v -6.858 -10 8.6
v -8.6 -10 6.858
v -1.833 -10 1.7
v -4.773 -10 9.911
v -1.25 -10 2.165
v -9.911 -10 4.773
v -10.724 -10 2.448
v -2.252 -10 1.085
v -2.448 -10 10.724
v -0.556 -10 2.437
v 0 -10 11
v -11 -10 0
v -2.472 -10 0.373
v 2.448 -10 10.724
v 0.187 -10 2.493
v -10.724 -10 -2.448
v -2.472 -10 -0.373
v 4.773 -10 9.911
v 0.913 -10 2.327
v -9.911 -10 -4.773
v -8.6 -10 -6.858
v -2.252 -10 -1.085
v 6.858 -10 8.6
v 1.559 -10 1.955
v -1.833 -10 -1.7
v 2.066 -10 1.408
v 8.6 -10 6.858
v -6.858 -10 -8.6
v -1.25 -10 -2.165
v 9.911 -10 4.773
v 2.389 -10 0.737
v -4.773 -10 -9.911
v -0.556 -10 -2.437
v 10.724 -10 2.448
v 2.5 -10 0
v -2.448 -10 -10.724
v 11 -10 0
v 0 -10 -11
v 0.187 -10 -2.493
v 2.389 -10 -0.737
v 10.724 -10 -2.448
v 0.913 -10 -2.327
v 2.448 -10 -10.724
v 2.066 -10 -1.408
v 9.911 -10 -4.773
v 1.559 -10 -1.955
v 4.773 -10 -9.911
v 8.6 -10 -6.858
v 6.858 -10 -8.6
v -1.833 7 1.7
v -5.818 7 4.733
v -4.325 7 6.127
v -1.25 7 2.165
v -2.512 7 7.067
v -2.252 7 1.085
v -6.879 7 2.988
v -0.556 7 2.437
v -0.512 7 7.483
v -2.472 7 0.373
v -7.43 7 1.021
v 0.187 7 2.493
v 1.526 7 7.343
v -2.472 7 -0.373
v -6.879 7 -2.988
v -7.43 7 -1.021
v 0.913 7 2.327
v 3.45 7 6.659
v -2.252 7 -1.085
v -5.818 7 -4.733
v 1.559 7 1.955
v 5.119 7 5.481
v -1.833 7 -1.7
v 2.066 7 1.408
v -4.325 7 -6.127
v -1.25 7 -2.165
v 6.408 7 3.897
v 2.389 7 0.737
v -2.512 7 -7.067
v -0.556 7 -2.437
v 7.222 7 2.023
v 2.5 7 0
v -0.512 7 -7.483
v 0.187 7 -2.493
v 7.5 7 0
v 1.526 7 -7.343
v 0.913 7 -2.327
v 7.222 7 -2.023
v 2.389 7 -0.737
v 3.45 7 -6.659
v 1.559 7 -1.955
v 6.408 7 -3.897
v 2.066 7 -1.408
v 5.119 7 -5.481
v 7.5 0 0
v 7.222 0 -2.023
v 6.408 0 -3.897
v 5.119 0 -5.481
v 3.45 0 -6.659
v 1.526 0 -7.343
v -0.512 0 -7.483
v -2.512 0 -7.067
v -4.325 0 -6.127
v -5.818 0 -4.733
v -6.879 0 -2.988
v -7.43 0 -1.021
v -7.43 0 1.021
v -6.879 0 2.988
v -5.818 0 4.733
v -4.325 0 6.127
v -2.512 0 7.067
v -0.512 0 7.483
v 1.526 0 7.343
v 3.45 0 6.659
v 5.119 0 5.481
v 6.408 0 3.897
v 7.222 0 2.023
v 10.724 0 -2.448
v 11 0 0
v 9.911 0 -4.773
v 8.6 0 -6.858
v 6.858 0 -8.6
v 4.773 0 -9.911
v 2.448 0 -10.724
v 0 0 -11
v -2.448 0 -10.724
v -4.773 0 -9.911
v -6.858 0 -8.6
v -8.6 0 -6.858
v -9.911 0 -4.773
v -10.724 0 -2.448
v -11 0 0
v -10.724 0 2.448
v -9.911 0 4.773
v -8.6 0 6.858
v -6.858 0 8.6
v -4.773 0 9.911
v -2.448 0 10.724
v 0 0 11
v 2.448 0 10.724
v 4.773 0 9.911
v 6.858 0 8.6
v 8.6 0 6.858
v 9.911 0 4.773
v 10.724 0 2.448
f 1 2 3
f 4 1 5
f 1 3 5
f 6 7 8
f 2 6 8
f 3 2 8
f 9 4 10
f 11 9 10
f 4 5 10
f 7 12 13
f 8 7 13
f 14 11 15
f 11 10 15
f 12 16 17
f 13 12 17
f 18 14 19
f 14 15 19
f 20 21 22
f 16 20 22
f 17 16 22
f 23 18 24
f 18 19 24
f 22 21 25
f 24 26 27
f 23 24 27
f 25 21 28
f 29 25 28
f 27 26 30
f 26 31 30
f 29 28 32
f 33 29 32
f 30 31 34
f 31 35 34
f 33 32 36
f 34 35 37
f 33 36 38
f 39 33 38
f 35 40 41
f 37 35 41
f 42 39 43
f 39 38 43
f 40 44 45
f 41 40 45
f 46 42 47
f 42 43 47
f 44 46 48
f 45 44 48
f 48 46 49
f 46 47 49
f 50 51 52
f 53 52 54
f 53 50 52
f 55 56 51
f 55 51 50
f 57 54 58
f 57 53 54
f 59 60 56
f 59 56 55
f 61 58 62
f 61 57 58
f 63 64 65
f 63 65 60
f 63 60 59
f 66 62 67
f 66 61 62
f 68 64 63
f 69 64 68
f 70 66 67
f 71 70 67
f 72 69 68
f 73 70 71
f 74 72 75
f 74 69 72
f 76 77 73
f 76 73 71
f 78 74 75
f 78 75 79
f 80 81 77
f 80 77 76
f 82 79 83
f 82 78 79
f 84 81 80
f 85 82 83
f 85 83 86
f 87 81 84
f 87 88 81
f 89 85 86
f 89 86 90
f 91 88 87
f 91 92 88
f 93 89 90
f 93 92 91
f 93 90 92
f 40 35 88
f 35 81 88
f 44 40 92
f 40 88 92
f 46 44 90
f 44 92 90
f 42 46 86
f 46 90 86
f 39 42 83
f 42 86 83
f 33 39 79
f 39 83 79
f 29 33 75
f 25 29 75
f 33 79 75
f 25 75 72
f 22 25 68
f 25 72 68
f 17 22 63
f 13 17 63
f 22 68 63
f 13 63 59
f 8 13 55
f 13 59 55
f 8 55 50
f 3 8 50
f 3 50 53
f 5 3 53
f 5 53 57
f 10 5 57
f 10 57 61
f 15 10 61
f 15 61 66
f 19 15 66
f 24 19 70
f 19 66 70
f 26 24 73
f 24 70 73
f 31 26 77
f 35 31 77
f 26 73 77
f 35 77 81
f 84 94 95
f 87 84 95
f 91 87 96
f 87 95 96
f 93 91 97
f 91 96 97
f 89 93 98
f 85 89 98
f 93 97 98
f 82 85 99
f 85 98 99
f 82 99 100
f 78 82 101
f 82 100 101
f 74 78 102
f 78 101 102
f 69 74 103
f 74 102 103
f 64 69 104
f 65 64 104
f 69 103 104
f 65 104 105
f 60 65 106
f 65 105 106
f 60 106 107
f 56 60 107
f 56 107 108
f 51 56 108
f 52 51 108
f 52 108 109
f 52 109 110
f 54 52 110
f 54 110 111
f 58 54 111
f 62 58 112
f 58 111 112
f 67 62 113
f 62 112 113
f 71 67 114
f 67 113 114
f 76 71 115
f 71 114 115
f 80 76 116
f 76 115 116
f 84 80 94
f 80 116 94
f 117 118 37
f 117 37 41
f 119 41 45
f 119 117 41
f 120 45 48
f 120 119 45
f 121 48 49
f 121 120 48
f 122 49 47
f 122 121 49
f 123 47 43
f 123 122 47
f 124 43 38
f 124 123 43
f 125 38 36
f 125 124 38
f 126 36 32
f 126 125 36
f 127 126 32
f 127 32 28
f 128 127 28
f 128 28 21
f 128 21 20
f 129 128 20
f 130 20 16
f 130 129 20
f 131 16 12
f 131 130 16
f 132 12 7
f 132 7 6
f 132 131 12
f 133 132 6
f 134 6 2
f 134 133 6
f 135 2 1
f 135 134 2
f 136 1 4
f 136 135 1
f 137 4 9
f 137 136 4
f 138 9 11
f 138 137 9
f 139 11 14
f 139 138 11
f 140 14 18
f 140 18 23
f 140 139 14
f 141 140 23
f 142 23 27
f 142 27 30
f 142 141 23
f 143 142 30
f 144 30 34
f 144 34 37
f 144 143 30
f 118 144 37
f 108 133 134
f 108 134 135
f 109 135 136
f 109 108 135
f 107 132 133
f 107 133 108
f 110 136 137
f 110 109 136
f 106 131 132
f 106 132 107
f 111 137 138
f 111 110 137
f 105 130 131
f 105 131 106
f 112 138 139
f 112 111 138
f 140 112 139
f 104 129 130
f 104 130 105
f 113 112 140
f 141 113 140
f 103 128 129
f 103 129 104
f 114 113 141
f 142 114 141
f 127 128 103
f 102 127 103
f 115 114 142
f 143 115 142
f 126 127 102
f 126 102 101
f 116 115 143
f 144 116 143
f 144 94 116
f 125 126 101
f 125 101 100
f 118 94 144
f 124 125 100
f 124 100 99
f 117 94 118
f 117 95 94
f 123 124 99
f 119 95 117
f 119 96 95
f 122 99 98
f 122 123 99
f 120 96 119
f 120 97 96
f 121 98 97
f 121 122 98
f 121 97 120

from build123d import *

# Parameters (mm, degrees)
SKETCH1_R               = 11
BOSS_EXTRUDE1_DEPTH     = 10
SKETCH1_3_R             = 7.5
BOSS_EXTRUDE2_DEPTH     = 7
CUT_EXTRUDE1_DEPTH      = 10
CUT_EXTRUDE1_DEPTH_BACK = 11
SKETCH1_4_R             = 2.5


with BuildPart() as part:
    # Sketch1 → Boss-Extrude1 (new body)
    with BuildSketch(Plane(origin=(0, 0, 0), x_dir=(1, 0, 0), z_dir=(0, 1, 0))):
        Circle(SKETCH1_R)
    extrude(amount=-BOSS_EXTRUDE1_DEPTH)

    # Sketch1<3> → Boss-Extrude2 (add)
    with BuildSketch(Plane(origin=(0, 0, 0), x_dir=(1, 0, 0), z_dir=(0, 1, 0))):
        Circle(SKETCH1_3_R)
    extrude(amount=BOSS_EXTRUDE2_DEPTH)

    # Sketch1<4> → Cut-Extrude1 (cut, two sides: drawn at the far end of the back side and taken through both)
    with BuildSketch(Plane(origin=(0, 0, 0), x_dir=(1, 0, 0), z_dir=(0, 1, 0)).offset(-CUT_EXTRUDE1_DEPTH_BACK)):
        Circle(SKETCH1_4_R)
    extrude(amount=CUT_EXTRUDE1_DEPTH + CUT_EXTRUDE1_DEPTH_BACK, mode=Mode.SUBTRACT)


solid = part.part
